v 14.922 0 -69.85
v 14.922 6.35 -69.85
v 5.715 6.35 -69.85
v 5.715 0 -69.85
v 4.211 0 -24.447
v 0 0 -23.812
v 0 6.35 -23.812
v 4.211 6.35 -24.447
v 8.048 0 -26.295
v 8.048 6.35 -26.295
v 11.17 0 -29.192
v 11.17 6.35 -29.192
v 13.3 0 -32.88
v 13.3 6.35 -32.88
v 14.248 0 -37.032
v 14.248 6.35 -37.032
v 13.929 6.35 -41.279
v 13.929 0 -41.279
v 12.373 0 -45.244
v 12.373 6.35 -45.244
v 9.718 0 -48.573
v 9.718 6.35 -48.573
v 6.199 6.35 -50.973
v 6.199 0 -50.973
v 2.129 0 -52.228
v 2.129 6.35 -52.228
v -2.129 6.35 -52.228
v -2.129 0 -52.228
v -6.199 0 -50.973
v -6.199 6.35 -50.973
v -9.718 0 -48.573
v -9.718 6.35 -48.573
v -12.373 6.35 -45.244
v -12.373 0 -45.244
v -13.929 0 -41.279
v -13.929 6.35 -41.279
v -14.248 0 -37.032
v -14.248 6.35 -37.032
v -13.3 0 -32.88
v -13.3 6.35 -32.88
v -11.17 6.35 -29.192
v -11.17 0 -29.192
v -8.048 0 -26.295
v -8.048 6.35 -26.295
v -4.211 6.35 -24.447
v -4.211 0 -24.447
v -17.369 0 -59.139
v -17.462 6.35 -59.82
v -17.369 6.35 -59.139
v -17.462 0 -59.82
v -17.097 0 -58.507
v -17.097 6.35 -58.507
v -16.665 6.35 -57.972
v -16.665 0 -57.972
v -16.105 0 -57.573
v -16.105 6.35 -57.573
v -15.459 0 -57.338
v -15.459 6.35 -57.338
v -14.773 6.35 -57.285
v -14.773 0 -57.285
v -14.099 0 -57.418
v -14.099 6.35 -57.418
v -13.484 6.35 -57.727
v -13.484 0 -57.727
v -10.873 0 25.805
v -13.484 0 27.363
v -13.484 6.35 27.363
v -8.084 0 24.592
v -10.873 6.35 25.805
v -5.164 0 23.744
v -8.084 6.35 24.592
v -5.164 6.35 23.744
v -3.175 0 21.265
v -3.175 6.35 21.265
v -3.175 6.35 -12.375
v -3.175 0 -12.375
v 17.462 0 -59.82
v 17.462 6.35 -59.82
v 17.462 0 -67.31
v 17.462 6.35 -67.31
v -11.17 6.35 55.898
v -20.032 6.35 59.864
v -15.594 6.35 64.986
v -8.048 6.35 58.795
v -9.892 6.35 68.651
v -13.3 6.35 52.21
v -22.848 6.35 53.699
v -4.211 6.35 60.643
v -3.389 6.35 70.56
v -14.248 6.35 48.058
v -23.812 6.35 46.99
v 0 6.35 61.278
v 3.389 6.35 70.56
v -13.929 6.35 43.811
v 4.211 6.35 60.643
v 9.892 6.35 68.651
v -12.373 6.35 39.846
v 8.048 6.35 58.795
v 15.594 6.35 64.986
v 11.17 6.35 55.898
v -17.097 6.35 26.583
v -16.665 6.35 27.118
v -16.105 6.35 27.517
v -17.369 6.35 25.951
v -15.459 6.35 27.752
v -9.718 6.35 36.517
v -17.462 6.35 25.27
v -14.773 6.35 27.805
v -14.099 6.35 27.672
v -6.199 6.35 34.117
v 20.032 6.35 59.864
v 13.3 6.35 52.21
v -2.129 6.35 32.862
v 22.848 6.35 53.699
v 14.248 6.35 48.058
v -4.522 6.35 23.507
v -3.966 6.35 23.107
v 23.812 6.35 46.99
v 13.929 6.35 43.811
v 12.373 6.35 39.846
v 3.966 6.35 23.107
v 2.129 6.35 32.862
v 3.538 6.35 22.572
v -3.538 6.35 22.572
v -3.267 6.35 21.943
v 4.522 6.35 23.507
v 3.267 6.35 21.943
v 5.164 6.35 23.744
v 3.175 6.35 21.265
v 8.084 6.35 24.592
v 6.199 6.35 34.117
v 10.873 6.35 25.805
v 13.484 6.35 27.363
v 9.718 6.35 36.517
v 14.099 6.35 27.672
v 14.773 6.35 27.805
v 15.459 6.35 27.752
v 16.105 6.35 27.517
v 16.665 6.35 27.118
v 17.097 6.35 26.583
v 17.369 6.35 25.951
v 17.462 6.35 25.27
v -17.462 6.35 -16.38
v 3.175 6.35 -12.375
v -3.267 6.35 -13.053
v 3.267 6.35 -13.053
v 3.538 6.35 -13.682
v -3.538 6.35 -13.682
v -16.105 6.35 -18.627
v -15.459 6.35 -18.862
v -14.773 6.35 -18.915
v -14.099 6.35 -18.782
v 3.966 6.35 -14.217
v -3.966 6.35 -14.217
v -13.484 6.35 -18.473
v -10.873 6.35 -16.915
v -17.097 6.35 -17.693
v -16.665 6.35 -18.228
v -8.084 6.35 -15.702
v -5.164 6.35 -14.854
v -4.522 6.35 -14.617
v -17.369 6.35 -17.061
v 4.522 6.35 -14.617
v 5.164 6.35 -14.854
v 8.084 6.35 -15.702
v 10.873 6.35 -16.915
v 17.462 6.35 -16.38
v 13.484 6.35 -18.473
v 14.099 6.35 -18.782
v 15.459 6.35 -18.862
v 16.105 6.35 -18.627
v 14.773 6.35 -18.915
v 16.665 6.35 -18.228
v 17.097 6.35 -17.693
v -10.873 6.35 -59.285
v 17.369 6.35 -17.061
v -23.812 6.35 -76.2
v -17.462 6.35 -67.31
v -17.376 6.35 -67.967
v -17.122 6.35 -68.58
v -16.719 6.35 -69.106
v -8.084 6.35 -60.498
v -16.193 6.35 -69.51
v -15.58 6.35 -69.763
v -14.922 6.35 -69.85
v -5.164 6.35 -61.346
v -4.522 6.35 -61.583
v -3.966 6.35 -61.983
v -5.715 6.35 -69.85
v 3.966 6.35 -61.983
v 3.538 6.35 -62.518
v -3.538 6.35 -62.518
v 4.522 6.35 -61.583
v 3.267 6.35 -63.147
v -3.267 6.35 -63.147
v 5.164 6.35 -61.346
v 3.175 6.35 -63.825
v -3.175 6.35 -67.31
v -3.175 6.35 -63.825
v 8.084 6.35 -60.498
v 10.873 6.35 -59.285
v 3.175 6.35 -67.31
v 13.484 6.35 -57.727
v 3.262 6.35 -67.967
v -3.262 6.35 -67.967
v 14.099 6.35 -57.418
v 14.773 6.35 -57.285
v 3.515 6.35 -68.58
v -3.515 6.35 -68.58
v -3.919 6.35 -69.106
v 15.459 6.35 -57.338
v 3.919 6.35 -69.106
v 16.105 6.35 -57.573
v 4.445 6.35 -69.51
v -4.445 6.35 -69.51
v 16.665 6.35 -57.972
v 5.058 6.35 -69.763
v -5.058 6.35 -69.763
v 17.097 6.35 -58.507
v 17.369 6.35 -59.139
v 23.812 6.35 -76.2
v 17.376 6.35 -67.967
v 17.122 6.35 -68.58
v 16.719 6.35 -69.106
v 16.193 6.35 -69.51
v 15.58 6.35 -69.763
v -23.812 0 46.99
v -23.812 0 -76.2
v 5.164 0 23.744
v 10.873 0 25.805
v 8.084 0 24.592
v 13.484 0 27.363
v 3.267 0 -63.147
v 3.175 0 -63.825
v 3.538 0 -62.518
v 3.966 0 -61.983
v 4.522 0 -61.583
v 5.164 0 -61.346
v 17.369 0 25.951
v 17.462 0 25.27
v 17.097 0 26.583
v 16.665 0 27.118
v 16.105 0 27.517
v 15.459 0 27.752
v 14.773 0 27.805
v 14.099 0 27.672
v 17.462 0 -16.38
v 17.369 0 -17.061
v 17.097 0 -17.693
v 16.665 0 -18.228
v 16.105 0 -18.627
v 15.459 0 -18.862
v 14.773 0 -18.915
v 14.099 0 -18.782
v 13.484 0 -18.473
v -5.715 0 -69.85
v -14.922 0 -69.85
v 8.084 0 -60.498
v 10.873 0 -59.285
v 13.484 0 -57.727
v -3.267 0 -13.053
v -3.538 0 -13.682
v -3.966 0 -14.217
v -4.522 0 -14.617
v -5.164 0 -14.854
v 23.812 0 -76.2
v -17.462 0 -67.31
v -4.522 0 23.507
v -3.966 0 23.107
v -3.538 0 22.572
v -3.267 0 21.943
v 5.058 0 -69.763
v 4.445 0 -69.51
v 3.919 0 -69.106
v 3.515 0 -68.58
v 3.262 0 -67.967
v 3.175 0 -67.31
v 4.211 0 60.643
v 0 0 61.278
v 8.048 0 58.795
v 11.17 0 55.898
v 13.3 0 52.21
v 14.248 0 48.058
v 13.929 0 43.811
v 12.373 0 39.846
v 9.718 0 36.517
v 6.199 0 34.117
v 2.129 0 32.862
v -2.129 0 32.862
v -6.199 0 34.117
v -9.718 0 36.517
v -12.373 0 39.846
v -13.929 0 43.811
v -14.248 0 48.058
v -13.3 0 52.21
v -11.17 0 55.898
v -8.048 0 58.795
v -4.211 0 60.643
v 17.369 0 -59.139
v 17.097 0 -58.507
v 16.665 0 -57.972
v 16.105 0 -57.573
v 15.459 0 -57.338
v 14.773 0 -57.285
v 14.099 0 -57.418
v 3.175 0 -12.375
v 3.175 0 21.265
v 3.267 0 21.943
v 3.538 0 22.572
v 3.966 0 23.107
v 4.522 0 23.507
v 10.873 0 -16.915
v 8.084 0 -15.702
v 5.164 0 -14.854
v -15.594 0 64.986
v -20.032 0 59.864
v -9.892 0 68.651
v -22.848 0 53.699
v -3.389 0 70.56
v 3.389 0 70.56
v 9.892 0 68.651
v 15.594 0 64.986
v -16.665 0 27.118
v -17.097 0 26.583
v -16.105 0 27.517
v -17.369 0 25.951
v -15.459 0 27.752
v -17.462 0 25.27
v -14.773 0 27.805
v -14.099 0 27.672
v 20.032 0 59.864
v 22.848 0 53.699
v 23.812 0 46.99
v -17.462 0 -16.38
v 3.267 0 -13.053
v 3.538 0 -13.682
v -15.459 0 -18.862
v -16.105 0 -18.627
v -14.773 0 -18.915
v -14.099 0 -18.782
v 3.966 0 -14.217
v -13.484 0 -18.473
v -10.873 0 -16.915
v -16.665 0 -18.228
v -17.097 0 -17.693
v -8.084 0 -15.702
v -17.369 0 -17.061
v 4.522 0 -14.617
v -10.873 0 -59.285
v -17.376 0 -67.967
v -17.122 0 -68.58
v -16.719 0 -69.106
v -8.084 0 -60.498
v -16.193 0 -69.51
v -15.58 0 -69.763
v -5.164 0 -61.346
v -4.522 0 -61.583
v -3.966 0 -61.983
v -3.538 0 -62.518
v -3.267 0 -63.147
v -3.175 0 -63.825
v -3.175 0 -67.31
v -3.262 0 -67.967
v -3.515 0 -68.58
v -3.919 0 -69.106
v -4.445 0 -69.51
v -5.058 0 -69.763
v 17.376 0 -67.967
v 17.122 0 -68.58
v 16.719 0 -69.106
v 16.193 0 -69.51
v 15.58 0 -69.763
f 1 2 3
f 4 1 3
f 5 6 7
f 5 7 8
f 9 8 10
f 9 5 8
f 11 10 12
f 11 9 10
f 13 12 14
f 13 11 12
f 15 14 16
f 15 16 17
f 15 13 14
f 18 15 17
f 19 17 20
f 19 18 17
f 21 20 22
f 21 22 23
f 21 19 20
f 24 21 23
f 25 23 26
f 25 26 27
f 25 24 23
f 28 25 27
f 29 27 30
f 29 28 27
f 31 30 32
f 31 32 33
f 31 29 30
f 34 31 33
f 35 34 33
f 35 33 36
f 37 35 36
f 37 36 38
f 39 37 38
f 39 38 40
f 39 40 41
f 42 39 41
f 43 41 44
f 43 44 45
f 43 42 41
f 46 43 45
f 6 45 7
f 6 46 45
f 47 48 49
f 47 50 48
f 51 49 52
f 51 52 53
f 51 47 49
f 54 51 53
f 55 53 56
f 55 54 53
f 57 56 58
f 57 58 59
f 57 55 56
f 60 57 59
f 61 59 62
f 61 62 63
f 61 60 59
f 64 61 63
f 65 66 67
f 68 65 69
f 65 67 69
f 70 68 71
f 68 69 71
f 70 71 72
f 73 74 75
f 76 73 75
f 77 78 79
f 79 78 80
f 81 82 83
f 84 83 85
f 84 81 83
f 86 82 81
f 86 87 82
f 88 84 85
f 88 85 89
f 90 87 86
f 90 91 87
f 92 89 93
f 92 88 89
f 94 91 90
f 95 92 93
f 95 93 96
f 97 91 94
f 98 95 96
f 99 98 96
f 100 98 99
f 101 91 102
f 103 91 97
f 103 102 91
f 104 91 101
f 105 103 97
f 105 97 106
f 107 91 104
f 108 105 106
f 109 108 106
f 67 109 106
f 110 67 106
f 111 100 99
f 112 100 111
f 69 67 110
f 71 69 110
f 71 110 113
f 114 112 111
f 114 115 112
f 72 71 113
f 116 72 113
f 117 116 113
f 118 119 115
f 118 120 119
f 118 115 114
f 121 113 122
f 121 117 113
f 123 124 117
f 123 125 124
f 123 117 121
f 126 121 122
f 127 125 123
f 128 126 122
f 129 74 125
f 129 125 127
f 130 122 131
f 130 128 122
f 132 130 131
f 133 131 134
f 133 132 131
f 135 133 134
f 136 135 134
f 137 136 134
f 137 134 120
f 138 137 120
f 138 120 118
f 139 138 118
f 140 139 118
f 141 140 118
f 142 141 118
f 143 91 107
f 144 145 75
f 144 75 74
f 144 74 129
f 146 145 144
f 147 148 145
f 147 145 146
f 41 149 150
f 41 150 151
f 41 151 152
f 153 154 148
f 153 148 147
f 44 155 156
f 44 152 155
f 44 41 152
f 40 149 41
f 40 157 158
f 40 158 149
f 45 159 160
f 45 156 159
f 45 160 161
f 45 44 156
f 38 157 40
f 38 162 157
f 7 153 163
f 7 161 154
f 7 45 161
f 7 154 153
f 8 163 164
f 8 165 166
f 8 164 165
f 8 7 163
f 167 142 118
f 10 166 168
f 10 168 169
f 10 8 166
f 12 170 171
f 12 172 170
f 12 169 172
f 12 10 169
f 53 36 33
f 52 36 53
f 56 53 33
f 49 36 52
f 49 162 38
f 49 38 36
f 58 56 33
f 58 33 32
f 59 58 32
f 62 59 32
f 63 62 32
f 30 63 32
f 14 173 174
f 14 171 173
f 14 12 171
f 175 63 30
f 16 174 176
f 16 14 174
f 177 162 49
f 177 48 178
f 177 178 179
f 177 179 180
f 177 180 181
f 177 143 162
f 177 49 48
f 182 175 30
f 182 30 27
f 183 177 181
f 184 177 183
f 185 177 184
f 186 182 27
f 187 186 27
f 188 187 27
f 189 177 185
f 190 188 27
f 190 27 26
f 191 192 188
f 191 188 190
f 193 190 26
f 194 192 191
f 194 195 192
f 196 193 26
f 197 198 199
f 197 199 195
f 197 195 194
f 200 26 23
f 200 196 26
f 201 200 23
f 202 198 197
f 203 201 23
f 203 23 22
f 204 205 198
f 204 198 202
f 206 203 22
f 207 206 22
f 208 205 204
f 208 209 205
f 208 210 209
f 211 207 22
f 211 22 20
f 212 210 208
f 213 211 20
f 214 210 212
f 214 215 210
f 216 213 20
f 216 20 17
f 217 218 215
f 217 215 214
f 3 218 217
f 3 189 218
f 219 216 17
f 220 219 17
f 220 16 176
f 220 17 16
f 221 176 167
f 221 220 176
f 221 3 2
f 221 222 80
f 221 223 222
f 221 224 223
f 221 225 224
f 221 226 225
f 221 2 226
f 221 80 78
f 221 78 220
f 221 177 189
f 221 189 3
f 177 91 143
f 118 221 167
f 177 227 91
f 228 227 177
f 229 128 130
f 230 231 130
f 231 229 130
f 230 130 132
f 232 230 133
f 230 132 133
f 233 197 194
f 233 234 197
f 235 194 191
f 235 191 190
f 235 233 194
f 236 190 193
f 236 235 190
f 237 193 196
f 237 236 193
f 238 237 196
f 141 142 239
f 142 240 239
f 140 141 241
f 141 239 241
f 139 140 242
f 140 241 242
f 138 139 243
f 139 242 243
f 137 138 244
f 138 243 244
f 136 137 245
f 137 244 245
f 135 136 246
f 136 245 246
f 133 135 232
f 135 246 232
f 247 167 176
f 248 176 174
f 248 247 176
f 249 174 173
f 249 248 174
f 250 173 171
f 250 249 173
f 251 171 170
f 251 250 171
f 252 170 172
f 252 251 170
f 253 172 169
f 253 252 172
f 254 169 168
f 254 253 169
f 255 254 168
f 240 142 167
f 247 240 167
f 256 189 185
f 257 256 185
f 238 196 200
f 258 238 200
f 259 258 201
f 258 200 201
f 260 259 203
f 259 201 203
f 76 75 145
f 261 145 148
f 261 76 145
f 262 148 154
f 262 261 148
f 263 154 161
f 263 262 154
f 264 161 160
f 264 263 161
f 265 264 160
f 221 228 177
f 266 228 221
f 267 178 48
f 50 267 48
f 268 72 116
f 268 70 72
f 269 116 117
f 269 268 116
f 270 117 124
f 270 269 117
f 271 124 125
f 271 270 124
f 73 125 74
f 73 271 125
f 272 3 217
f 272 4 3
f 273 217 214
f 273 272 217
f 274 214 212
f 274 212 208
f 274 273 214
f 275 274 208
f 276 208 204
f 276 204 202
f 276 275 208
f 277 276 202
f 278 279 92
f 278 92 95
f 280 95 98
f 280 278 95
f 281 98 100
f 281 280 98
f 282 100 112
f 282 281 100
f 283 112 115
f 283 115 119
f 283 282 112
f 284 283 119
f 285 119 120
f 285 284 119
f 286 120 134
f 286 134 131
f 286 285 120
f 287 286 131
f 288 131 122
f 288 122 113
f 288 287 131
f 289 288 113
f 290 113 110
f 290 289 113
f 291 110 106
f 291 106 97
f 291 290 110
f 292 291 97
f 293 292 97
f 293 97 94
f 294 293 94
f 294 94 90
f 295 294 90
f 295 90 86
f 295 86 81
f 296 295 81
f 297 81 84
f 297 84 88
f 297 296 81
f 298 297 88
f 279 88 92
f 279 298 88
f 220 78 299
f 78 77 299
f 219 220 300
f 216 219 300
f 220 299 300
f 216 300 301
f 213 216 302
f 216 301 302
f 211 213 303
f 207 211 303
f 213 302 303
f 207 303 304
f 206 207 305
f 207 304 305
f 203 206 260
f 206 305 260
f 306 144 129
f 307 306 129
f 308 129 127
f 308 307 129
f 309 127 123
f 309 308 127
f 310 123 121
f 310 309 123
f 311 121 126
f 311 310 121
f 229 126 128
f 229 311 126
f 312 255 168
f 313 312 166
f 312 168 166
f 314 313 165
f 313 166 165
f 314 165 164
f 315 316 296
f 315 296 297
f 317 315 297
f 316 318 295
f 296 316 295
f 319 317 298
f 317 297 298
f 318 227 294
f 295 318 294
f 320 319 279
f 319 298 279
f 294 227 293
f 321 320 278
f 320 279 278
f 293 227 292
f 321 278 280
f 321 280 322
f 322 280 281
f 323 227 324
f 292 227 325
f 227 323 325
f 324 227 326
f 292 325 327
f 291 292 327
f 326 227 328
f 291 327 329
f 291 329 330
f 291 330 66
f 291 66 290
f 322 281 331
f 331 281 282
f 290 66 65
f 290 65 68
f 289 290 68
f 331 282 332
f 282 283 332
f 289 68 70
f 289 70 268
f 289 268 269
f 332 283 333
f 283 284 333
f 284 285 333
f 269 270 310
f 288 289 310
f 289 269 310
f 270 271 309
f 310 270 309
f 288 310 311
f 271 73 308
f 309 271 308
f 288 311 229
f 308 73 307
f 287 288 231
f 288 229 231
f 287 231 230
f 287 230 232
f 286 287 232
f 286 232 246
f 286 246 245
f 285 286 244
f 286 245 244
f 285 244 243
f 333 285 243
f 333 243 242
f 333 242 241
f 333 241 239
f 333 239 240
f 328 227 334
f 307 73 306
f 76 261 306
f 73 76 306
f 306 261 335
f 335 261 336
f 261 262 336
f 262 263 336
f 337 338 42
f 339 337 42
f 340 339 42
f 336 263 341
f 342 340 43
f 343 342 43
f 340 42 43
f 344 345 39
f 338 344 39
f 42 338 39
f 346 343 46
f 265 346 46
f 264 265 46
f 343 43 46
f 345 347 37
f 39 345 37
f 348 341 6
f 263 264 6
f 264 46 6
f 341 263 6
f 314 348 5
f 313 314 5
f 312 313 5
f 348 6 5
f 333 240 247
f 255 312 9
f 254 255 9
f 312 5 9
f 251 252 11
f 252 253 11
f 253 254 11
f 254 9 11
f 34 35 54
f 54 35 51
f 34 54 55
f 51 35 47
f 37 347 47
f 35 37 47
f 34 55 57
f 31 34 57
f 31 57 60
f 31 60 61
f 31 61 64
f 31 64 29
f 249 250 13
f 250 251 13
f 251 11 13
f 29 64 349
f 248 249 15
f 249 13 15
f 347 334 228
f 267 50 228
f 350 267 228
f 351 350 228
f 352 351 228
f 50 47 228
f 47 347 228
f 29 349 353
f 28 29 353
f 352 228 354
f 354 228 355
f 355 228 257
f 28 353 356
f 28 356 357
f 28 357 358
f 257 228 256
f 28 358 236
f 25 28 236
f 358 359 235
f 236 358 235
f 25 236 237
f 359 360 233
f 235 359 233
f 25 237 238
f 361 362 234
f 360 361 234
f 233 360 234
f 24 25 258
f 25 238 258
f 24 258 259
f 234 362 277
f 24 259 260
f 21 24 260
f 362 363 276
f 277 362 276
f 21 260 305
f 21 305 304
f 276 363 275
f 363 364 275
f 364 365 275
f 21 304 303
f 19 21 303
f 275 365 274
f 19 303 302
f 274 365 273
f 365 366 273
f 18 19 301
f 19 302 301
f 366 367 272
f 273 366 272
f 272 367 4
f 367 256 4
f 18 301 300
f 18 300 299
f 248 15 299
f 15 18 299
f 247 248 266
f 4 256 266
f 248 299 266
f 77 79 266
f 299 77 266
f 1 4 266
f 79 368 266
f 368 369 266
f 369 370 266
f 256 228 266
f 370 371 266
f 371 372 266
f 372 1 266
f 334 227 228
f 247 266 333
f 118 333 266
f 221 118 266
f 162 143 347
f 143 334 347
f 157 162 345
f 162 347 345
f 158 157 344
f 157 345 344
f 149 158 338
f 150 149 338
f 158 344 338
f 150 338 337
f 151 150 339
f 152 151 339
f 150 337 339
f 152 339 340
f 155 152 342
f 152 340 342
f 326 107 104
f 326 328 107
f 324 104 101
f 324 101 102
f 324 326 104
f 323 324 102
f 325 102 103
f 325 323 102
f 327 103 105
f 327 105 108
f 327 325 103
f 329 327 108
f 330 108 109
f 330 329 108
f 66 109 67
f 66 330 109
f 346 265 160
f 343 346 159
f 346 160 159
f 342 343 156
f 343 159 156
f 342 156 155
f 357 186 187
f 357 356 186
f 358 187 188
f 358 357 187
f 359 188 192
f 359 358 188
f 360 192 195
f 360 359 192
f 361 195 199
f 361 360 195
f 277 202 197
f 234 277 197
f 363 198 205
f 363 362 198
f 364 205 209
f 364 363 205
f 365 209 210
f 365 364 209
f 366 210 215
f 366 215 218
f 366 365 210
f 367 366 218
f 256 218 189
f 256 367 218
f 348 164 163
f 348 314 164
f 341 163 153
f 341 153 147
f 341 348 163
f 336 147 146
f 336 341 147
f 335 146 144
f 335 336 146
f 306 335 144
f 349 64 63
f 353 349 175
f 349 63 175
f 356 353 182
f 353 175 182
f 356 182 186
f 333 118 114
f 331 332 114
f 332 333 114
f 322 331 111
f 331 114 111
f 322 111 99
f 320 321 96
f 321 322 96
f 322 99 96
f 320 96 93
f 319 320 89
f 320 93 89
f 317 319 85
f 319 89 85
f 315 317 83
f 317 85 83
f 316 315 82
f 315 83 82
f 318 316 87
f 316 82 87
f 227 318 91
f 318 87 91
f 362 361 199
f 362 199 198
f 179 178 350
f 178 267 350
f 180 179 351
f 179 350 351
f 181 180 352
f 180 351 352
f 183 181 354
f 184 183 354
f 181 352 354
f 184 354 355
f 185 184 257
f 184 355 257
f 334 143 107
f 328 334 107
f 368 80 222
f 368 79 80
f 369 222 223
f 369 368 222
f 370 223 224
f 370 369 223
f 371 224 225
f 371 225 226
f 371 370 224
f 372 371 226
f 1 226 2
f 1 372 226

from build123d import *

# Parameters (mm, degrees)
SKETCH1_W           = 47.625
SKETCH1_H           = 152.4
SKETCH1_R           = 14.2875
BOSS_EXTRUDE1_DEPTH = 6.35
CUT_EXTRUDE1_DEPTH  = 81.086188923
FILLET1_R           = 2.54


with BuildPart() as part:
    # Sketch1 → Boss-Extrude1 (new body)
    with BuildSketch(Plane(origin=(0, 0, 0), x_dir=(1, 0, 0), z_dir=(0, 1, 0))):
        Rectangle(SKETCH1_W, SKETCH1_H)
        with Locations(Location((0, 38.1, 0), (0, 0, 270))):
            Circle(SKETCH1_R, mode=Mode.SUBTRACT)
        with Locations(Location((0, -46.99, 0), (0, 0, 270))):
            Circle(SKETCH1_R, mode=Mode.SUBTRACT)
    extrude(amount=BOSS_EXTRUDE1_DEPTH)

    # Sketch2 → Cut-Extrude1 (cut, through all)
    with BuildSketch(Plane(origin=(0, 6.35, 0), x_dir=(1, 0, 0), z_dir=(0, 1, 0))):
        with BuildLine():
            ThreePointArc((23.8125, -46.99), (0, -70.8025), (-23.8125, -46.99))
            Line((-23.8125, -46.99), (-23.8125, -76.2))
            Line((-23.8125, -76.2), (23.8125, -76.2))
            Line((23.8125, -76.2), (23.8125, -46.99))
        make_face()
        with BuildLine():
            Line((-17.4625, 69.85), (-17.4625, 54.289386956))
            ThreePointArc((-17.4625, 54.289386956), (-10.963825458, 59.238346377), (-3.175, 61.699884136))
            Line((-3.175, 61.699884136), (-3.175, 69.85))
            Line((-3.175, 69.85), (-17.4625, 69.85))
        make_face()
        with BuildLine():
            ThreePointArc((-3.175, 14.500115864), (-10.963825458, 16.961653623), (-17.4625, 21.910613044))
            Line((-17.4625, 21.910613044), (-17.4625, -30.800613044))
            ThreePointArc((-17.4625, -30.800613044), (-10.963825458, -25.851653623), (-3.175, -23.390115864))
            Line((-3.175, -23.390115864), (-3.175, 14.500115864))
        make_face()
        with BuildLine():
            ThreePointArc((3.175, 61.699884136), (10.963825458, 59.238346377), (17.4625, 54.289386956))
            Line((17.4625, 54.289386956), (17.4625, 69.85))
            Line((17.4625, 69.85), (3.175, 69.85))
            Line((3.175, 69.85), (3.175, 61.699884136))
        make_face()
        with BuildLine():
            Line((17.4625, -30.800613044), (17.4625, 21.910613044))
            ThreePointArc((17.4625, 21.910613044), (10.963825458, 16.961653623), (3.175, 14.500115864))
            Line((3.175, 14.500115864), (3.175, -23.390115864))
            ThreePointArc((3.175, -23.390115864), (10.963825458, -25.851653623), (17.4625, -30.800613044))
        make_face()
    extrude(amount=-CUT_EXTRUDE1_DEPTH, mode=Mode.SUBTRACT)

    # Fillet1
    fillet1_edges = [part.edges().sort_by_distance(p)[0] for p in [
        (17.4625, 3.175, 30.800613044),
        (3.175, 3.175, 23.390115864),
        (3.175, 3.175, -14.500115864),
        (17.4625, 3.175, -21.910613044),
        (-3.175, 3.175, 23.390115864),
        (-17.4625, 3.175, 30.800613044),
        (-17.4625, 3.175, -21.910613044),
        (-3.175, 3.175, -14.500115864),
        (-3.175, 3.175, -61.699884136),
        (-17.4625, 3.175, -54.289386956),
        (-17.4625, 3.175, -69.85),
        (-3.175, 3.175, -69.85),
        (17.4625, 3.175, -54.289386956),
        (3.175, 3.175, -61.699884136),
        (3.175, 3.175, -69.85),
        (17.4625, 3.175, -69.85),
    ]]
    fillet(fillet1_edges, radius=FILLET1_R)


solid = part.part
